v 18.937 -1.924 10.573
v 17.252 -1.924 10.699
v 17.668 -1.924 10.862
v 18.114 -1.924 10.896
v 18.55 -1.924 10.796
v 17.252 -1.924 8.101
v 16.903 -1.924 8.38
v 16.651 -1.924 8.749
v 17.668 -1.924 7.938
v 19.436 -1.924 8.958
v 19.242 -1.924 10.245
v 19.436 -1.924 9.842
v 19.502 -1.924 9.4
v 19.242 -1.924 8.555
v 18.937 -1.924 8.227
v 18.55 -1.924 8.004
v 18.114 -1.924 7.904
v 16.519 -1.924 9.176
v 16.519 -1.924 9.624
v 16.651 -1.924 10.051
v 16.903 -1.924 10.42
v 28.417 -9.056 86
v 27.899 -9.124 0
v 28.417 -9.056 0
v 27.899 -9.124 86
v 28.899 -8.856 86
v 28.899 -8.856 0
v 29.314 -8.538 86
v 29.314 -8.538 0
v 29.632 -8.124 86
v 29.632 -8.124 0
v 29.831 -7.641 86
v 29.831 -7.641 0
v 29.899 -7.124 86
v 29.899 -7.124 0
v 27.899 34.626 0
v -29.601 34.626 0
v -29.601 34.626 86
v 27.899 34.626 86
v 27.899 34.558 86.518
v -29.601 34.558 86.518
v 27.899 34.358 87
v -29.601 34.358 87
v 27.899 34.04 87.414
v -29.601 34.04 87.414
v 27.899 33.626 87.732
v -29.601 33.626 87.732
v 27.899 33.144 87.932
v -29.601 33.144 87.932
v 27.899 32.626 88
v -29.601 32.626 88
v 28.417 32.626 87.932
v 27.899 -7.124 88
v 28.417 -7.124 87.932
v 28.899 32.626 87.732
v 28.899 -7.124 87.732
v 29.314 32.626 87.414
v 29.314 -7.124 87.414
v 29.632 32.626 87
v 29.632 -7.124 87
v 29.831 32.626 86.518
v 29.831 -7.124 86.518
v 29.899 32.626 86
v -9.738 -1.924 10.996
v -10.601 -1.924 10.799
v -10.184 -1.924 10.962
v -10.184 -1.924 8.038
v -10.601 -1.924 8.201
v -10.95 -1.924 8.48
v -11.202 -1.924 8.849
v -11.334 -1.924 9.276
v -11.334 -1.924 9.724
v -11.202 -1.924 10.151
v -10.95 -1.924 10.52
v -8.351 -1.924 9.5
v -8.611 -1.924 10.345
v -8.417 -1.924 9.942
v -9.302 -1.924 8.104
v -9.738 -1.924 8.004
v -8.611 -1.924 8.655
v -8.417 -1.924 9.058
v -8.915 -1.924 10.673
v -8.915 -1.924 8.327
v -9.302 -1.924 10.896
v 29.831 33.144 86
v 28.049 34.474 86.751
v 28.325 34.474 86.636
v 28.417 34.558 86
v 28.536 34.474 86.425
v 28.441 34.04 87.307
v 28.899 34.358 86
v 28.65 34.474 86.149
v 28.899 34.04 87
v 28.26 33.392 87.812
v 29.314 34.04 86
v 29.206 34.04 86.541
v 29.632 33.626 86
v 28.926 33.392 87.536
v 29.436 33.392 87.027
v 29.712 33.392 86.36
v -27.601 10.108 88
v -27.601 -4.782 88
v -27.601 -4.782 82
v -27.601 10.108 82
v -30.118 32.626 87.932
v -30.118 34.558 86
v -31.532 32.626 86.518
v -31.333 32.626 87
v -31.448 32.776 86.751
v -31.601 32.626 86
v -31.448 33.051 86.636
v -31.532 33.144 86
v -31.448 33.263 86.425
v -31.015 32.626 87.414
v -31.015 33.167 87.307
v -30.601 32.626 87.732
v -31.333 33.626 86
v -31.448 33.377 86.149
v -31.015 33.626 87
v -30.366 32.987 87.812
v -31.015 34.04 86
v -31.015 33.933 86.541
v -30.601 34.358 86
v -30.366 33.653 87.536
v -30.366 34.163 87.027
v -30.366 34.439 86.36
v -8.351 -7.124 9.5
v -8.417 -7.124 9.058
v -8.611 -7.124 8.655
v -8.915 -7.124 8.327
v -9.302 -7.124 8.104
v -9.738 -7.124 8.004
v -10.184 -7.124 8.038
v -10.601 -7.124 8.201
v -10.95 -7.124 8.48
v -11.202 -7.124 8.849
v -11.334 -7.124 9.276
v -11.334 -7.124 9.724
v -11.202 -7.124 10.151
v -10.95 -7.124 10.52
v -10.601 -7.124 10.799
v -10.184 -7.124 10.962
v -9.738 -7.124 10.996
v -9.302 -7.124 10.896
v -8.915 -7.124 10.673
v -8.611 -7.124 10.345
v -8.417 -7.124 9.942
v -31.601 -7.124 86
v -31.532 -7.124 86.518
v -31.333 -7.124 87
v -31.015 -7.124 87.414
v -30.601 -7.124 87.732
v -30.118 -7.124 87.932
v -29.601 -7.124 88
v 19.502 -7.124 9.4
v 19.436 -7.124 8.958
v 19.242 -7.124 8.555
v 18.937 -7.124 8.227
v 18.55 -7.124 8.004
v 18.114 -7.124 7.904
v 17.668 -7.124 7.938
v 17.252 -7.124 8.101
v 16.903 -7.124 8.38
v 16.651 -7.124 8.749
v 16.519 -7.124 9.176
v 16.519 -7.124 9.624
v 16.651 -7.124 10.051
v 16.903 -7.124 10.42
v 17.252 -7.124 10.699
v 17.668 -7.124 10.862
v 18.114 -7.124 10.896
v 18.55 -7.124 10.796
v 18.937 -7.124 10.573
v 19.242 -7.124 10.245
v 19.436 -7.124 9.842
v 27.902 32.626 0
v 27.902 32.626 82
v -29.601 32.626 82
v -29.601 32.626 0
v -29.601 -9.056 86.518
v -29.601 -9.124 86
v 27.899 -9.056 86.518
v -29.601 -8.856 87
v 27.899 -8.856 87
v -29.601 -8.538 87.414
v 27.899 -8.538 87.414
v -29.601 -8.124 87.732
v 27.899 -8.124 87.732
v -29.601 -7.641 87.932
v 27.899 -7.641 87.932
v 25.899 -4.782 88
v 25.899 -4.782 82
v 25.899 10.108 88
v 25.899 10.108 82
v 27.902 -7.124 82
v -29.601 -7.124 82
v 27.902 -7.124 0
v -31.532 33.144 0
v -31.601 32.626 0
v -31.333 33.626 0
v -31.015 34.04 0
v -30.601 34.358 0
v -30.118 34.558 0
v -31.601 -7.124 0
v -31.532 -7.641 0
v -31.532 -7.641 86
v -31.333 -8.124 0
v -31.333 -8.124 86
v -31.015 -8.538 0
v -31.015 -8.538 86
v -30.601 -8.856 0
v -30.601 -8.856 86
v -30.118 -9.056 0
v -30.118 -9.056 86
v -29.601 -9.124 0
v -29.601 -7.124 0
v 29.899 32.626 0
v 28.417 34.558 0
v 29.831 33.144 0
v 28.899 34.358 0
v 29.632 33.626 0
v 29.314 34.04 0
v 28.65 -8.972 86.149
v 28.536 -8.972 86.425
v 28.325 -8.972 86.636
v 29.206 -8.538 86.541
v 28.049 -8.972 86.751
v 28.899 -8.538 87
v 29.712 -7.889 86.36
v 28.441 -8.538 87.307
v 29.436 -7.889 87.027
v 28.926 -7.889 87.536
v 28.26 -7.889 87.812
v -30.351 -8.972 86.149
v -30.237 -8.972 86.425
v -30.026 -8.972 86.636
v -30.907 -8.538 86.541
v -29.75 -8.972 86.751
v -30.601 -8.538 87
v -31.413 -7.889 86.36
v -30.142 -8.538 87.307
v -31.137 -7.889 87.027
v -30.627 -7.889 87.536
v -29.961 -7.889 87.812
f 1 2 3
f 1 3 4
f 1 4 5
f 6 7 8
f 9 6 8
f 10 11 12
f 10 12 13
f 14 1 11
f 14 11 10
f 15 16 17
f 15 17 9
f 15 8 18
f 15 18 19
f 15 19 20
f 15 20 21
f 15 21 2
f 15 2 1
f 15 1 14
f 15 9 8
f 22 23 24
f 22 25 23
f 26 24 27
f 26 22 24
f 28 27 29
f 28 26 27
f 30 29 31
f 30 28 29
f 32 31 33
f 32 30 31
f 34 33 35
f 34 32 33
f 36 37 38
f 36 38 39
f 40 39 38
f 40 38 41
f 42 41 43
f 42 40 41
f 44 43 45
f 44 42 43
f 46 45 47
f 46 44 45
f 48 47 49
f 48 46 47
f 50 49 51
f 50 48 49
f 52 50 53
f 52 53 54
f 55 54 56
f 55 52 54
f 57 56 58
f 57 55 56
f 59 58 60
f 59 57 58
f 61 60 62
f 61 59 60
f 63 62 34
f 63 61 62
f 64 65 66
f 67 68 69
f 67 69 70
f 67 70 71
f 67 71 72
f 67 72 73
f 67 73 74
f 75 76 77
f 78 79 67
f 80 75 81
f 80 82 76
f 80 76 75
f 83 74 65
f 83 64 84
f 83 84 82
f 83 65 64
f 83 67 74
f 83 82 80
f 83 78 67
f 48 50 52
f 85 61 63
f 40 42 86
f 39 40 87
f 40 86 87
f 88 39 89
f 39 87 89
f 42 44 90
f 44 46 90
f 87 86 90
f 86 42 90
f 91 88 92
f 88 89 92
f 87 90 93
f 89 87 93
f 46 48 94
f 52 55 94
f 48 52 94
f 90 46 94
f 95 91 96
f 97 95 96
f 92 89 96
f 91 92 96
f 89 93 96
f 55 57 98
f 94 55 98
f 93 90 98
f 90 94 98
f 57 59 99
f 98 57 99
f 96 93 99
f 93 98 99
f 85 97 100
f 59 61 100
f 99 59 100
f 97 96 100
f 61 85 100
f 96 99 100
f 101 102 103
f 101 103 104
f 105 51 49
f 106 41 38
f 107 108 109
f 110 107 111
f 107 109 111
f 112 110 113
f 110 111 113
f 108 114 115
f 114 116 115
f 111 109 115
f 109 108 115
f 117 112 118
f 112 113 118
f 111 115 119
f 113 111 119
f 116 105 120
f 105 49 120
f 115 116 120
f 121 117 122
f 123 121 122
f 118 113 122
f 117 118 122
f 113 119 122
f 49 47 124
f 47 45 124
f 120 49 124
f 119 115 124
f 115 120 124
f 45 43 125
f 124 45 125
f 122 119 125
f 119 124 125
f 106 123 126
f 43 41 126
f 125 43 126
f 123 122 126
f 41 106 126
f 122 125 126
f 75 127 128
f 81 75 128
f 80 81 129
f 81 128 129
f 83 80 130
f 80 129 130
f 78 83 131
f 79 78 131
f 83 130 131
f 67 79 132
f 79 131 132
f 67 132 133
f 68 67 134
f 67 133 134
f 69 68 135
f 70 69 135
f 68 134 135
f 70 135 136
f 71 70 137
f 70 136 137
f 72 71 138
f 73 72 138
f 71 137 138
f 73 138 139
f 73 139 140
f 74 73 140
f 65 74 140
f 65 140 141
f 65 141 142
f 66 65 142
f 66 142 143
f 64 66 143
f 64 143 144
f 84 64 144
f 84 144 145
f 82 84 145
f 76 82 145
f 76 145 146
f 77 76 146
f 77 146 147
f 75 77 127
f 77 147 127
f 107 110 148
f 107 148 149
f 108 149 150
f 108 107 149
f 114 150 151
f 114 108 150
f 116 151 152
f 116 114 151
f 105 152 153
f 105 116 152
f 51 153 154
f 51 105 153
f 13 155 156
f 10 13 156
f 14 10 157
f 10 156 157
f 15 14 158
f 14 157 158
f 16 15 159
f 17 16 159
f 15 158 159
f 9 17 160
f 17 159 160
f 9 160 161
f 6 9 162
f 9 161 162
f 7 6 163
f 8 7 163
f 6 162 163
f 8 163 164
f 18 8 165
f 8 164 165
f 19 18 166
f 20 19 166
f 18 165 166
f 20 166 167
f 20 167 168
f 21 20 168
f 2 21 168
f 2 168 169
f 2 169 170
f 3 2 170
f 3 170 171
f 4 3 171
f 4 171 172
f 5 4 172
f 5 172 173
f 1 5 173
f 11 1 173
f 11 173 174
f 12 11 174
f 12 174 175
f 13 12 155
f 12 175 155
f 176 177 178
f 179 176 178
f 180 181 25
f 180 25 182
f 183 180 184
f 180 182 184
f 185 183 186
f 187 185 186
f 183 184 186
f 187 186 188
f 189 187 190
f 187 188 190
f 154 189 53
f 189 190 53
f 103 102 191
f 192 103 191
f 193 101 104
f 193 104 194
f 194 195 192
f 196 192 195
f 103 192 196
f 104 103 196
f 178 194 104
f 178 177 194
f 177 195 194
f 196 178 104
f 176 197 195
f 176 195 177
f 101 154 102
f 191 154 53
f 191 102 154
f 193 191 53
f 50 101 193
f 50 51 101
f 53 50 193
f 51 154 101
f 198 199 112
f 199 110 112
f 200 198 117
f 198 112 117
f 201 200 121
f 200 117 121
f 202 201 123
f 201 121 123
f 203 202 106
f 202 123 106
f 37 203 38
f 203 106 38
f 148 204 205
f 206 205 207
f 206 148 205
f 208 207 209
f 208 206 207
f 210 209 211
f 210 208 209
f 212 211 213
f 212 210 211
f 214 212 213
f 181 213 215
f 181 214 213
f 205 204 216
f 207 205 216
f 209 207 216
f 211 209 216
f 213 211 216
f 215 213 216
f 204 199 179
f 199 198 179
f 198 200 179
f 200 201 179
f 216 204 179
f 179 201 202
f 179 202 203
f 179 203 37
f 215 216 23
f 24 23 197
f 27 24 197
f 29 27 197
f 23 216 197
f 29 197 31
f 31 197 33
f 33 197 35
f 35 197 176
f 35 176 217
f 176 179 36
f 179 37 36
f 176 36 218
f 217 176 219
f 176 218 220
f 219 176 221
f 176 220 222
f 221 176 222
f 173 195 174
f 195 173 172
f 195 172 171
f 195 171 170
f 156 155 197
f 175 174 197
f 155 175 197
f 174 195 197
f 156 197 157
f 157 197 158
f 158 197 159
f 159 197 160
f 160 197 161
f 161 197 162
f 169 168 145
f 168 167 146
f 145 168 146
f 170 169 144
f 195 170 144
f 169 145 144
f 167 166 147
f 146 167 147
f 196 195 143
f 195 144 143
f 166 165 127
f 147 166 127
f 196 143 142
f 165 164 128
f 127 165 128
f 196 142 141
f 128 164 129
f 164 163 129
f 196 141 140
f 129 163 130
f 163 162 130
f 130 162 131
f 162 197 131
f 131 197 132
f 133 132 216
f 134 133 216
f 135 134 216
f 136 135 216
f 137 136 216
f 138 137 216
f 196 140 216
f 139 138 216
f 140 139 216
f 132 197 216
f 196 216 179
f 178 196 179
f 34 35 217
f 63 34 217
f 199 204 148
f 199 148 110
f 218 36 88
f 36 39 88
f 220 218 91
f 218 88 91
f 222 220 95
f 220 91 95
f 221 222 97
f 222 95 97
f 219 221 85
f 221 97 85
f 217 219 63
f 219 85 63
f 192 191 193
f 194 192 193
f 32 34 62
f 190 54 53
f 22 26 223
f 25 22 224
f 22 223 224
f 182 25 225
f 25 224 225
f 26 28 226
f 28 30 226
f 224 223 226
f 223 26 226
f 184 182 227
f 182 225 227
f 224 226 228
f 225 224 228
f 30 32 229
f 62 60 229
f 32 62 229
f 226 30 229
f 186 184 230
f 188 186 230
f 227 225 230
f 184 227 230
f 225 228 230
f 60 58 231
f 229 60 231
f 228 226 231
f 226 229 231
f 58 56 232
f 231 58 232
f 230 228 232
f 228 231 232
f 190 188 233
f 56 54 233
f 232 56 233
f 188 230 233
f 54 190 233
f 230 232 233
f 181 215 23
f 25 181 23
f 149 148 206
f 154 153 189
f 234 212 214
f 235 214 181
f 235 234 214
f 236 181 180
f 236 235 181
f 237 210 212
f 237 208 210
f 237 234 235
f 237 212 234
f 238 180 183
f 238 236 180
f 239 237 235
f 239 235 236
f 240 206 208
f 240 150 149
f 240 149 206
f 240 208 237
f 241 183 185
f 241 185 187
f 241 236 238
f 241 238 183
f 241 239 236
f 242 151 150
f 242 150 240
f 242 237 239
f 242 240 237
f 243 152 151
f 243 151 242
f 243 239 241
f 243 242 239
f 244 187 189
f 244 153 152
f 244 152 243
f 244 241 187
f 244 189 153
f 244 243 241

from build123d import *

# Parameters (mm, degrees)
ESQUISSE1_W             = 61.5
ESQUISSE1_H             = 43.75
BOSS_EXTRU_1_DEPTH      = 88
ENL_V_MAT_EXTRU_4_REACH = 90
ESQUISSE3_W             = 53.5
ESQUISSE3_H             = 14.889849441
ESQUISSE6_W             = 57.502648101
ESQUISSE6_H             = 39.75
ENL_V_MAT_EXTRU_5_DEPTH = 82
CONG_4_R                = 2
ESQUISSE7_R             = 1.5
BOSS_EXTRU_2_DEPTH      = 5.2
ESQUISSE8_R             = 1.5
BOSS_EXTRU_3_DEPTH      = 5.2


with BuildPart() as part:
    # Esquisse1 → Boss.-Extru.1 (new body)
    with BuildSketch(Plane.XY):
        with Locations((-0.850502513, 12.751256281)):
            Rectangle(ESQUISSE1_W, ESQUISSE1_H)
    extrude(amount=BOSS_EXTRU_1_DEPTH)

    # Esquisse3 → Enlèv. mat.-Extru.4 (cut, up to next)
    with BuildSketch(Plane.XY.offset(88), mode=Mode.PRIVATE) as enl_v_mat_extru_4_sk1:
        with Locations((-0.850502513, 2.663299217)):
            Rectangle(ESQUISSE3_W, ESQUISSE3_H)
    enl_v_mat_extru_4_tool1 = extrude(enl_v_mat_extru_4_sk1.sketch, amount=-ENL_V_MAT_EXTRU_4_REACH, mode=Mode.PRIVATE) & part.part
    add(enl_v_mat_extru_4_tool1.solids().sort_by_distance((-0.850503, 2.663299, 88))[0], mode=Mode.SUBTRACT)

    # Esquisse6 → Enlèv. mat.-Extru.5 (cut)
    with BuildSketch(Plane(origin=(0, 0, 0), x_dir=(-1, 0, 0), z_dir=(0, 0, -1))):
        with Locations((0.849178462, 12.751256281)):
            Rectangle(ESQUISSE6_W, ESQUISSE6_H)
    extrude(amount=-ENL_V_MAT_EXTRU_5_DEPTH, mode=Mode.SUBTRACT)

    # Congé4
    cong_4_edges = [part.edges().sort_by_distance(p)[0] for p in [
        (29.899497487, 12.751256281, 88),
        (-0.850502513, 34.626256281, 88),
        (-31.600502513, 12.751256281, 88),
        (-31.600502513, 34.626256281, 44),
        (29.899497487, 34.626256281, 44),
        (29.899497487, -9.123743719, 44),
        (-31.600502513, -9.123743719, 44),
        (-0.850502513, -9.123743719, 88),
    ]]
    fillet(cong_4_edges, radius=CONG_4_R)

    # Esquisse7 → Boss.-Extru.2 (add)
    with BuildSketch(Plane(origin=(0, -7.123743719, 0), x_dir=(1, 0, 0), z_dir=(0, 1, 0))):
        with Locations((18.002145588, -9.4)):
            Circle(ESQUISSE7_R)
    extrude(amount=BOSS_EXTRU_2_DEPTH)

    # Esquisse8 → Boss.-Extru.3 (add)
    with BuildSketch(Plane(origin=(0, -7.123743719, 0), x_dir=(1, 0, 0), z_dir=(0, 1, 0))):
        with Locations((-9.850502513, -9.5)):
            Circle(ESQUISSE8_R)
    extrude(amount=BOSS_EXTRU_3_DEPTH)


solid = part.part
